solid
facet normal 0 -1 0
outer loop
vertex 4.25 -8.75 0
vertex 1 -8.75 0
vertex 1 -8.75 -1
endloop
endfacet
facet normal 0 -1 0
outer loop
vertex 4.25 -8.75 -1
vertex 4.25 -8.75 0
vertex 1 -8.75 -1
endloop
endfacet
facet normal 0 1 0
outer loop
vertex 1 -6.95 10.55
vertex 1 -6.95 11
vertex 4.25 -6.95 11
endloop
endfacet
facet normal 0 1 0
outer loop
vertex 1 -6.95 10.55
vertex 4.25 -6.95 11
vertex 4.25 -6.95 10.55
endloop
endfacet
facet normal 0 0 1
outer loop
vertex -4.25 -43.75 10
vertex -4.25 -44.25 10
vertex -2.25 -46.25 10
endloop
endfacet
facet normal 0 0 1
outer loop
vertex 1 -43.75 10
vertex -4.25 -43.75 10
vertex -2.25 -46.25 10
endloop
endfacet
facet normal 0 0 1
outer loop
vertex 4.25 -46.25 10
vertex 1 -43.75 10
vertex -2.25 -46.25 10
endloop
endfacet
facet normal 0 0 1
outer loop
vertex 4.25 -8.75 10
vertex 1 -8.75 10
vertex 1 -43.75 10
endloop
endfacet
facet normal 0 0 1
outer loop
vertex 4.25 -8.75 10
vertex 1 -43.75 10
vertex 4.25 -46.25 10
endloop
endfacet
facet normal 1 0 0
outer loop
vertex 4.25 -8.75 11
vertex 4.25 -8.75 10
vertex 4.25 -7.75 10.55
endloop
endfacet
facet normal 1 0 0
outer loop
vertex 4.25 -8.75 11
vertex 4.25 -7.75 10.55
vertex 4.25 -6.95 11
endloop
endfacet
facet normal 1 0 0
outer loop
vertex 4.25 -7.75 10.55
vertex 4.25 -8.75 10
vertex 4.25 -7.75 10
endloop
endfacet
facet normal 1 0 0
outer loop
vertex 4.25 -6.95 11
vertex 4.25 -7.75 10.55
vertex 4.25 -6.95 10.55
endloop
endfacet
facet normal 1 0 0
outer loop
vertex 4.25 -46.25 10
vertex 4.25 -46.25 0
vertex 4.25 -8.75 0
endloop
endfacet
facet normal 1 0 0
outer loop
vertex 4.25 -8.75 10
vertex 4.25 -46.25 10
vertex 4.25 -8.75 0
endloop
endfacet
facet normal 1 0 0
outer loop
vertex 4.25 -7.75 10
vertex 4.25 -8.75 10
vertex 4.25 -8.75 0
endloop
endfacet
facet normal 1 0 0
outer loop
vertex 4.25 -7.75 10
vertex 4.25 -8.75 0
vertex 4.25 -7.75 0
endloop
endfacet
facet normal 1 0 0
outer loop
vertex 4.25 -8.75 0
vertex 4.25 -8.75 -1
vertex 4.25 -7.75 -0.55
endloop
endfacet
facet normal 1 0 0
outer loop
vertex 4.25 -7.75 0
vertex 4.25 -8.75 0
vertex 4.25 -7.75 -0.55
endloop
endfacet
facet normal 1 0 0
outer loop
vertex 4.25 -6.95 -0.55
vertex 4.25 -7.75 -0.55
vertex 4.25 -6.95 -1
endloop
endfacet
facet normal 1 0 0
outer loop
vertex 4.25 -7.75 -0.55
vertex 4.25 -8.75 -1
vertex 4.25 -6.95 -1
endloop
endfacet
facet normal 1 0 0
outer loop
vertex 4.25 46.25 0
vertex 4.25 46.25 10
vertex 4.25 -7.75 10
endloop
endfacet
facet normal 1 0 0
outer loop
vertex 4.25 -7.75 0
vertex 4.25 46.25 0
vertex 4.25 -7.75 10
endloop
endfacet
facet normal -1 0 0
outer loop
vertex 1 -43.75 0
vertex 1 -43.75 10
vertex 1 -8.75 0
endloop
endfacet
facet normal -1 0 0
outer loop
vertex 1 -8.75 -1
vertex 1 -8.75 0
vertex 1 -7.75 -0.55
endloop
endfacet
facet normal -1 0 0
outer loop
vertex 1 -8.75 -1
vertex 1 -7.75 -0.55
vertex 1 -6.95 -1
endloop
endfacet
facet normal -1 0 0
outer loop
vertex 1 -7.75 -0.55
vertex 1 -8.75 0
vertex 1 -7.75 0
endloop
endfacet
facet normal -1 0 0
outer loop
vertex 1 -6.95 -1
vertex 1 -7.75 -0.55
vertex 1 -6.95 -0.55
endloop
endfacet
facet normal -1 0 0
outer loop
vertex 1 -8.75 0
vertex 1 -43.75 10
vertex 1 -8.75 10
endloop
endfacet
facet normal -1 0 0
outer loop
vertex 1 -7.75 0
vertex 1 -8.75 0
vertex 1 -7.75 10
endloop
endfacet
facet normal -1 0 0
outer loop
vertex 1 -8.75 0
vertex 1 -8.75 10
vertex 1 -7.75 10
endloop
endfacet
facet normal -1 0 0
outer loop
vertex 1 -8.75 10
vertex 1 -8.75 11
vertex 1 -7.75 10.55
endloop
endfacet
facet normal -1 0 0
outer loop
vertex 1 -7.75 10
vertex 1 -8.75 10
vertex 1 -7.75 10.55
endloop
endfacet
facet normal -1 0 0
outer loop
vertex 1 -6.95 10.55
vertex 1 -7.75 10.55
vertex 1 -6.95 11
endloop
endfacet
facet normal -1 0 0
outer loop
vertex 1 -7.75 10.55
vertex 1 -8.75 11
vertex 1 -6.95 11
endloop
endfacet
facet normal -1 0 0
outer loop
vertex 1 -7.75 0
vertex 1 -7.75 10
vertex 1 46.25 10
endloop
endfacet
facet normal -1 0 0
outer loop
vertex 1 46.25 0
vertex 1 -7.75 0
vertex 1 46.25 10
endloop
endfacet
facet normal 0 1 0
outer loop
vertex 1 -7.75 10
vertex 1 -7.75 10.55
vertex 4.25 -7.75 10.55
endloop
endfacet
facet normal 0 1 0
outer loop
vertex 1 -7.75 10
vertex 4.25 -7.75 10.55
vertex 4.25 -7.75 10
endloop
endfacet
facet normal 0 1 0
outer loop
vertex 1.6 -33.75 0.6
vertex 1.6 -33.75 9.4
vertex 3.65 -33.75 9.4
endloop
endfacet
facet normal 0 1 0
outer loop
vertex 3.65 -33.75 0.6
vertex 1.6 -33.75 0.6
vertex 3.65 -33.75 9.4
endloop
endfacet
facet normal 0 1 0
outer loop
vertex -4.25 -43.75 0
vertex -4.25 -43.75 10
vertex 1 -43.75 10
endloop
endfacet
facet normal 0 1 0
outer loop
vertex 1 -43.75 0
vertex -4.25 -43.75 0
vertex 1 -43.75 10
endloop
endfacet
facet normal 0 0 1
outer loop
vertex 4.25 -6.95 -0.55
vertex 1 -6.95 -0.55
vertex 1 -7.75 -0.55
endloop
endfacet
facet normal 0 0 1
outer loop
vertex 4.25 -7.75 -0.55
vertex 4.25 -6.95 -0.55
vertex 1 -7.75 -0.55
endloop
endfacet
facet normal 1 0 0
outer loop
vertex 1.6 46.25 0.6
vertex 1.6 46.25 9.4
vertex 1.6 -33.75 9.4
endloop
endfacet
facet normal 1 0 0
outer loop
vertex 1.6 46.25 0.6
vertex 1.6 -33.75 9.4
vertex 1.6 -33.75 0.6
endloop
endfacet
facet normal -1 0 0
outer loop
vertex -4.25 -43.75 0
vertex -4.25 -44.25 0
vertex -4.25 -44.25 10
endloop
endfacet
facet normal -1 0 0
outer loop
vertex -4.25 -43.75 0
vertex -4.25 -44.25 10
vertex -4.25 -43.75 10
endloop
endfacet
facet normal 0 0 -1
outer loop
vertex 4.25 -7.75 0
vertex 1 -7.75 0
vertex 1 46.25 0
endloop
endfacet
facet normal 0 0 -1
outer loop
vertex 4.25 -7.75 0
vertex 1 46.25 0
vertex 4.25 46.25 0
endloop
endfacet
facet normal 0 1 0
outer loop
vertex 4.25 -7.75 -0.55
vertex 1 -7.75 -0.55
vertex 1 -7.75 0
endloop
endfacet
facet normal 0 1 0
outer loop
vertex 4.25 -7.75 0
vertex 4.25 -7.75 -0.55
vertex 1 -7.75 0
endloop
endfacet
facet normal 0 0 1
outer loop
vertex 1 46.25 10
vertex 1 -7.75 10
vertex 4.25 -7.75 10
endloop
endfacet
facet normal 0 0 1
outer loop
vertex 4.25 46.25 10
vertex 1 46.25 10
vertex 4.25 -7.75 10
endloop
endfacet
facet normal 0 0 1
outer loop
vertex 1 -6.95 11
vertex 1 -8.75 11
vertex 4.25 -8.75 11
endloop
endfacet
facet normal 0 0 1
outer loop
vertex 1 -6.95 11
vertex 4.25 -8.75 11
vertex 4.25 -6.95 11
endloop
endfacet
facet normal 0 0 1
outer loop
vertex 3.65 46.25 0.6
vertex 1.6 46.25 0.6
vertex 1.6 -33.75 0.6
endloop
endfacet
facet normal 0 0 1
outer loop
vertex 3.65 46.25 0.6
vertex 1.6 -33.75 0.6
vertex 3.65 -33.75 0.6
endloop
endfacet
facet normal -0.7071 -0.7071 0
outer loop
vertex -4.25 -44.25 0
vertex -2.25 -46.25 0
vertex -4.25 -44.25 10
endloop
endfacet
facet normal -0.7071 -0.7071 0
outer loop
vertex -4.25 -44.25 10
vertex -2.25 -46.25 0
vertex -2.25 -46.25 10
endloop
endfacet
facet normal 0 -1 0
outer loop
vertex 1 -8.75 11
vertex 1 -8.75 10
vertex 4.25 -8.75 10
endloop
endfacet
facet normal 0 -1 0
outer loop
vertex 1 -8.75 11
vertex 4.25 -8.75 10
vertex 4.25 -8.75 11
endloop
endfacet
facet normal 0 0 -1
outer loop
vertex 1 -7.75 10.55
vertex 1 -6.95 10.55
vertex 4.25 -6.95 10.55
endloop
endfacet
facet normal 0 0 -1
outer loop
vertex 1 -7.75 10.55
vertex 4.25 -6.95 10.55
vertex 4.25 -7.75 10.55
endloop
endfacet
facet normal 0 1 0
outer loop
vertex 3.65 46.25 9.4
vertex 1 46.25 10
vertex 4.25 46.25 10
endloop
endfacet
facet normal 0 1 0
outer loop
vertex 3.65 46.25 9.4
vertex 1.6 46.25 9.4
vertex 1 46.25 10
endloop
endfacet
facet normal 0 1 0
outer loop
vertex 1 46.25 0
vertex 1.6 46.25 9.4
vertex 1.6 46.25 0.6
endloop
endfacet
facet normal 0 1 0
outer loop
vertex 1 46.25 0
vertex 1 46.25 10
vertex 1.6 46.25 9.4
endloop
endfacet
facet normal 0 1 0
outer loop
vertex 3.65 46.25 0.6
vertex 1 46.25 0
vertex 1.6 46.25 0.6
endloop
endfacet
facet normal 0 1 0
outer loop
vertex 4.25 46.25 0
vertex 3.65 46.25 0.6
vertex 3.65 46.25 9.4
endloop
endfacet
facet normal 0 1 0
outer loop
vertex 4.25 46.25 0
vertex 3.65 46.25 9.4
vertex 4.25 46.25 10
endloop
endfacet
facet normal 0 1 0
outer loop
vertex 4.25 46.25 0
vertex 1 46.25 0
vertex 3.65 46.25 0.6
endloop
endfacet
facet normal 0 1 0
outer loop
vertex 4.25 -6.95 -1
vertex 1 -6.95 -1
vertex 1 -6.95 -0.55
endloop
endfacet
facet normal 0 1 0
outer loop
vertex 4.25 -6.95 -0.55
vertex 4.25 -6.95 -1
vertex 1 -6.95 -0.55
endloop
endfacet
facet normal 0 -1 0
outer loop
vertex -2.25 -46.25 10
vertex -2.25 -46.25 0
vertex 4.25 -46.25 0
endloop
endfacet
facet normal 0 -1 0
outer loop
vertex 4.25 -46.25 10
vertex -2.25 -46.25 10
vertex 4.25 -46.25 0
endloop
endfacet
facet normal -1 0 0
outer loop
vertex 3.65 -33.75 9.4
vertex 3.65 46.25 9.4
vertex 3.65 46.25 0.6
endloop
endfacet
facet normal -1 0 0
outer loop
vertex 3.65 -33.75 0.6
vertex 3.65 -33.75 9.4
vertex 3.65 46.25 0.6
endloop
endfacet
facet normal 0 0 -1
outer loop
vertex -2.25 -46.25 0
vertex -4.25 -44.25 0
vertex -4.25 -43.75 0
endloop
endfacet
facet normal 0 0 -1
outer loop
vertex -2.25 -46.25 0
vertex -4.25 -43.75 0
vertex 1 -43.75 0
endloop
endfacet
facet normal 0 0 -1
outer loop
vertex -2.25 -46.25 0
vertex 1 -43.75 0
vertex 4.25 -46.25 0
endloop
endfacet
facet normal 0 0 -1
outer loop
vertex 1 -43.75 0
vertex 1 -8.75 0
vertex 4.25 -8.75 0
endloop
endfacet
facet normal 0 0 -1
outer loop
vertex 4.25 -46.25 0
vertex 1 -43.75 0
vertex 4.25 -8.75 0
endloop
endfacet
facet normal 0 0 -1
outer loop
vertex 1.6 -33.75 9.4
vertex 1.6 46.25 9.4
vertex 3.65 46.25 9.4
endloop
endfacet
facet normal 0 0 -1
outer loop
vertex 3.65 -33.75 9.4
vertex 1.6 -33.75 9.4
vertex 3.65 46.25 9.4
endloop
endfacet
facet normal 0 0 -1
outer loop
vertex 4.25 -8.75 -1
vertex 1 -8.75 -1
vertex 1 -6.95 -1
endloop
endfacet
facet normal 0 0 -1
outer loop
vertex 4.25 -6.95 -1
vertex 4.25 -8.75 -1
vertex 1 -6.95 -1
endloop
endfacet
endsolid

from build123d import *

# Parameters (mm, degrees)
SKETCH1_W           = 8.5
SKETCH1_H           = 92.5
BOSS_EXTRUDE1_DEPTH = 10
SKETCH2_W           = 5.25
SKETCH2_H           = 90
CUT_EXTRUDE3_DEPTH  = 80
CHAMFER1_SIZE       = 2
BOSS_EXTRUDE3_DEPTH = 3.25
SKETCH9_W           = 2.05
SKETCH9_H           = 8.8
CUT_EXTRUDE4_DEPTH  = 80


with BuildPart() as part:
    # Sketch1 → Boss-Extrude1 (new body)
    with BuildSketch(Plane.XY):
        Rectangle(SKETCH1_W, SKETCH1_H)
    extrude(amount=BOSS_EXTRUDE1_DEPTH)

    # Sketch2 → Cut-Extrude3 (cut)
    with BuildSketch(Plane.XY.offset(10)):
        with Locations((-1.625, 1.25)):
            Rectangle(SKETCH2_W, SKETCH2_H)
    extrude(amount=-CUT_EXTRUDE3_DEPTH, mode=Mode.SUBTRACT)

    # Chamfer1
    chamfer1_edges = [part.edges().sort_by_distance(p)[0] for p in [
        (-4.25, -46.25, 5),
    ]]
    chamfer(chamfer1_edges, length=CHAMFER1_SIZE)

    # Sketch7 → Boss-Extrude3 (add)
    with BuildSketch(Plane.ZY.offset(-1)):
        Polygon((10, -8.75), (11, -8.75), (11, -6.95), (10.55, -6.95), (10.55, -7.75), (10, -7.75), align=None)
    boss_extrude3 = extrude(amount=-BOSS_EXTRUDE3_DEPTH)

    # Mirror2: Boss-Extrude3 across plane
    add(boss_extrude3.mirror(Plane.XY.offset(5)))

    # Sketch9 → Cut-Extrude4 (cut)
    with BuildSketch(Plane(origin=(0, 46.25, 0), x_dir=(1, 0, 0), z_dir=(0, 1, 0))):
        with Locations((2.625, -5)):
            Rectangle(SKETCH9_W, SKETCH9_H)
    extrude(amount=-CUT_EXTRUDE4_DEPTH, mode=Mode.SUBTRACT)


solid = part.part
